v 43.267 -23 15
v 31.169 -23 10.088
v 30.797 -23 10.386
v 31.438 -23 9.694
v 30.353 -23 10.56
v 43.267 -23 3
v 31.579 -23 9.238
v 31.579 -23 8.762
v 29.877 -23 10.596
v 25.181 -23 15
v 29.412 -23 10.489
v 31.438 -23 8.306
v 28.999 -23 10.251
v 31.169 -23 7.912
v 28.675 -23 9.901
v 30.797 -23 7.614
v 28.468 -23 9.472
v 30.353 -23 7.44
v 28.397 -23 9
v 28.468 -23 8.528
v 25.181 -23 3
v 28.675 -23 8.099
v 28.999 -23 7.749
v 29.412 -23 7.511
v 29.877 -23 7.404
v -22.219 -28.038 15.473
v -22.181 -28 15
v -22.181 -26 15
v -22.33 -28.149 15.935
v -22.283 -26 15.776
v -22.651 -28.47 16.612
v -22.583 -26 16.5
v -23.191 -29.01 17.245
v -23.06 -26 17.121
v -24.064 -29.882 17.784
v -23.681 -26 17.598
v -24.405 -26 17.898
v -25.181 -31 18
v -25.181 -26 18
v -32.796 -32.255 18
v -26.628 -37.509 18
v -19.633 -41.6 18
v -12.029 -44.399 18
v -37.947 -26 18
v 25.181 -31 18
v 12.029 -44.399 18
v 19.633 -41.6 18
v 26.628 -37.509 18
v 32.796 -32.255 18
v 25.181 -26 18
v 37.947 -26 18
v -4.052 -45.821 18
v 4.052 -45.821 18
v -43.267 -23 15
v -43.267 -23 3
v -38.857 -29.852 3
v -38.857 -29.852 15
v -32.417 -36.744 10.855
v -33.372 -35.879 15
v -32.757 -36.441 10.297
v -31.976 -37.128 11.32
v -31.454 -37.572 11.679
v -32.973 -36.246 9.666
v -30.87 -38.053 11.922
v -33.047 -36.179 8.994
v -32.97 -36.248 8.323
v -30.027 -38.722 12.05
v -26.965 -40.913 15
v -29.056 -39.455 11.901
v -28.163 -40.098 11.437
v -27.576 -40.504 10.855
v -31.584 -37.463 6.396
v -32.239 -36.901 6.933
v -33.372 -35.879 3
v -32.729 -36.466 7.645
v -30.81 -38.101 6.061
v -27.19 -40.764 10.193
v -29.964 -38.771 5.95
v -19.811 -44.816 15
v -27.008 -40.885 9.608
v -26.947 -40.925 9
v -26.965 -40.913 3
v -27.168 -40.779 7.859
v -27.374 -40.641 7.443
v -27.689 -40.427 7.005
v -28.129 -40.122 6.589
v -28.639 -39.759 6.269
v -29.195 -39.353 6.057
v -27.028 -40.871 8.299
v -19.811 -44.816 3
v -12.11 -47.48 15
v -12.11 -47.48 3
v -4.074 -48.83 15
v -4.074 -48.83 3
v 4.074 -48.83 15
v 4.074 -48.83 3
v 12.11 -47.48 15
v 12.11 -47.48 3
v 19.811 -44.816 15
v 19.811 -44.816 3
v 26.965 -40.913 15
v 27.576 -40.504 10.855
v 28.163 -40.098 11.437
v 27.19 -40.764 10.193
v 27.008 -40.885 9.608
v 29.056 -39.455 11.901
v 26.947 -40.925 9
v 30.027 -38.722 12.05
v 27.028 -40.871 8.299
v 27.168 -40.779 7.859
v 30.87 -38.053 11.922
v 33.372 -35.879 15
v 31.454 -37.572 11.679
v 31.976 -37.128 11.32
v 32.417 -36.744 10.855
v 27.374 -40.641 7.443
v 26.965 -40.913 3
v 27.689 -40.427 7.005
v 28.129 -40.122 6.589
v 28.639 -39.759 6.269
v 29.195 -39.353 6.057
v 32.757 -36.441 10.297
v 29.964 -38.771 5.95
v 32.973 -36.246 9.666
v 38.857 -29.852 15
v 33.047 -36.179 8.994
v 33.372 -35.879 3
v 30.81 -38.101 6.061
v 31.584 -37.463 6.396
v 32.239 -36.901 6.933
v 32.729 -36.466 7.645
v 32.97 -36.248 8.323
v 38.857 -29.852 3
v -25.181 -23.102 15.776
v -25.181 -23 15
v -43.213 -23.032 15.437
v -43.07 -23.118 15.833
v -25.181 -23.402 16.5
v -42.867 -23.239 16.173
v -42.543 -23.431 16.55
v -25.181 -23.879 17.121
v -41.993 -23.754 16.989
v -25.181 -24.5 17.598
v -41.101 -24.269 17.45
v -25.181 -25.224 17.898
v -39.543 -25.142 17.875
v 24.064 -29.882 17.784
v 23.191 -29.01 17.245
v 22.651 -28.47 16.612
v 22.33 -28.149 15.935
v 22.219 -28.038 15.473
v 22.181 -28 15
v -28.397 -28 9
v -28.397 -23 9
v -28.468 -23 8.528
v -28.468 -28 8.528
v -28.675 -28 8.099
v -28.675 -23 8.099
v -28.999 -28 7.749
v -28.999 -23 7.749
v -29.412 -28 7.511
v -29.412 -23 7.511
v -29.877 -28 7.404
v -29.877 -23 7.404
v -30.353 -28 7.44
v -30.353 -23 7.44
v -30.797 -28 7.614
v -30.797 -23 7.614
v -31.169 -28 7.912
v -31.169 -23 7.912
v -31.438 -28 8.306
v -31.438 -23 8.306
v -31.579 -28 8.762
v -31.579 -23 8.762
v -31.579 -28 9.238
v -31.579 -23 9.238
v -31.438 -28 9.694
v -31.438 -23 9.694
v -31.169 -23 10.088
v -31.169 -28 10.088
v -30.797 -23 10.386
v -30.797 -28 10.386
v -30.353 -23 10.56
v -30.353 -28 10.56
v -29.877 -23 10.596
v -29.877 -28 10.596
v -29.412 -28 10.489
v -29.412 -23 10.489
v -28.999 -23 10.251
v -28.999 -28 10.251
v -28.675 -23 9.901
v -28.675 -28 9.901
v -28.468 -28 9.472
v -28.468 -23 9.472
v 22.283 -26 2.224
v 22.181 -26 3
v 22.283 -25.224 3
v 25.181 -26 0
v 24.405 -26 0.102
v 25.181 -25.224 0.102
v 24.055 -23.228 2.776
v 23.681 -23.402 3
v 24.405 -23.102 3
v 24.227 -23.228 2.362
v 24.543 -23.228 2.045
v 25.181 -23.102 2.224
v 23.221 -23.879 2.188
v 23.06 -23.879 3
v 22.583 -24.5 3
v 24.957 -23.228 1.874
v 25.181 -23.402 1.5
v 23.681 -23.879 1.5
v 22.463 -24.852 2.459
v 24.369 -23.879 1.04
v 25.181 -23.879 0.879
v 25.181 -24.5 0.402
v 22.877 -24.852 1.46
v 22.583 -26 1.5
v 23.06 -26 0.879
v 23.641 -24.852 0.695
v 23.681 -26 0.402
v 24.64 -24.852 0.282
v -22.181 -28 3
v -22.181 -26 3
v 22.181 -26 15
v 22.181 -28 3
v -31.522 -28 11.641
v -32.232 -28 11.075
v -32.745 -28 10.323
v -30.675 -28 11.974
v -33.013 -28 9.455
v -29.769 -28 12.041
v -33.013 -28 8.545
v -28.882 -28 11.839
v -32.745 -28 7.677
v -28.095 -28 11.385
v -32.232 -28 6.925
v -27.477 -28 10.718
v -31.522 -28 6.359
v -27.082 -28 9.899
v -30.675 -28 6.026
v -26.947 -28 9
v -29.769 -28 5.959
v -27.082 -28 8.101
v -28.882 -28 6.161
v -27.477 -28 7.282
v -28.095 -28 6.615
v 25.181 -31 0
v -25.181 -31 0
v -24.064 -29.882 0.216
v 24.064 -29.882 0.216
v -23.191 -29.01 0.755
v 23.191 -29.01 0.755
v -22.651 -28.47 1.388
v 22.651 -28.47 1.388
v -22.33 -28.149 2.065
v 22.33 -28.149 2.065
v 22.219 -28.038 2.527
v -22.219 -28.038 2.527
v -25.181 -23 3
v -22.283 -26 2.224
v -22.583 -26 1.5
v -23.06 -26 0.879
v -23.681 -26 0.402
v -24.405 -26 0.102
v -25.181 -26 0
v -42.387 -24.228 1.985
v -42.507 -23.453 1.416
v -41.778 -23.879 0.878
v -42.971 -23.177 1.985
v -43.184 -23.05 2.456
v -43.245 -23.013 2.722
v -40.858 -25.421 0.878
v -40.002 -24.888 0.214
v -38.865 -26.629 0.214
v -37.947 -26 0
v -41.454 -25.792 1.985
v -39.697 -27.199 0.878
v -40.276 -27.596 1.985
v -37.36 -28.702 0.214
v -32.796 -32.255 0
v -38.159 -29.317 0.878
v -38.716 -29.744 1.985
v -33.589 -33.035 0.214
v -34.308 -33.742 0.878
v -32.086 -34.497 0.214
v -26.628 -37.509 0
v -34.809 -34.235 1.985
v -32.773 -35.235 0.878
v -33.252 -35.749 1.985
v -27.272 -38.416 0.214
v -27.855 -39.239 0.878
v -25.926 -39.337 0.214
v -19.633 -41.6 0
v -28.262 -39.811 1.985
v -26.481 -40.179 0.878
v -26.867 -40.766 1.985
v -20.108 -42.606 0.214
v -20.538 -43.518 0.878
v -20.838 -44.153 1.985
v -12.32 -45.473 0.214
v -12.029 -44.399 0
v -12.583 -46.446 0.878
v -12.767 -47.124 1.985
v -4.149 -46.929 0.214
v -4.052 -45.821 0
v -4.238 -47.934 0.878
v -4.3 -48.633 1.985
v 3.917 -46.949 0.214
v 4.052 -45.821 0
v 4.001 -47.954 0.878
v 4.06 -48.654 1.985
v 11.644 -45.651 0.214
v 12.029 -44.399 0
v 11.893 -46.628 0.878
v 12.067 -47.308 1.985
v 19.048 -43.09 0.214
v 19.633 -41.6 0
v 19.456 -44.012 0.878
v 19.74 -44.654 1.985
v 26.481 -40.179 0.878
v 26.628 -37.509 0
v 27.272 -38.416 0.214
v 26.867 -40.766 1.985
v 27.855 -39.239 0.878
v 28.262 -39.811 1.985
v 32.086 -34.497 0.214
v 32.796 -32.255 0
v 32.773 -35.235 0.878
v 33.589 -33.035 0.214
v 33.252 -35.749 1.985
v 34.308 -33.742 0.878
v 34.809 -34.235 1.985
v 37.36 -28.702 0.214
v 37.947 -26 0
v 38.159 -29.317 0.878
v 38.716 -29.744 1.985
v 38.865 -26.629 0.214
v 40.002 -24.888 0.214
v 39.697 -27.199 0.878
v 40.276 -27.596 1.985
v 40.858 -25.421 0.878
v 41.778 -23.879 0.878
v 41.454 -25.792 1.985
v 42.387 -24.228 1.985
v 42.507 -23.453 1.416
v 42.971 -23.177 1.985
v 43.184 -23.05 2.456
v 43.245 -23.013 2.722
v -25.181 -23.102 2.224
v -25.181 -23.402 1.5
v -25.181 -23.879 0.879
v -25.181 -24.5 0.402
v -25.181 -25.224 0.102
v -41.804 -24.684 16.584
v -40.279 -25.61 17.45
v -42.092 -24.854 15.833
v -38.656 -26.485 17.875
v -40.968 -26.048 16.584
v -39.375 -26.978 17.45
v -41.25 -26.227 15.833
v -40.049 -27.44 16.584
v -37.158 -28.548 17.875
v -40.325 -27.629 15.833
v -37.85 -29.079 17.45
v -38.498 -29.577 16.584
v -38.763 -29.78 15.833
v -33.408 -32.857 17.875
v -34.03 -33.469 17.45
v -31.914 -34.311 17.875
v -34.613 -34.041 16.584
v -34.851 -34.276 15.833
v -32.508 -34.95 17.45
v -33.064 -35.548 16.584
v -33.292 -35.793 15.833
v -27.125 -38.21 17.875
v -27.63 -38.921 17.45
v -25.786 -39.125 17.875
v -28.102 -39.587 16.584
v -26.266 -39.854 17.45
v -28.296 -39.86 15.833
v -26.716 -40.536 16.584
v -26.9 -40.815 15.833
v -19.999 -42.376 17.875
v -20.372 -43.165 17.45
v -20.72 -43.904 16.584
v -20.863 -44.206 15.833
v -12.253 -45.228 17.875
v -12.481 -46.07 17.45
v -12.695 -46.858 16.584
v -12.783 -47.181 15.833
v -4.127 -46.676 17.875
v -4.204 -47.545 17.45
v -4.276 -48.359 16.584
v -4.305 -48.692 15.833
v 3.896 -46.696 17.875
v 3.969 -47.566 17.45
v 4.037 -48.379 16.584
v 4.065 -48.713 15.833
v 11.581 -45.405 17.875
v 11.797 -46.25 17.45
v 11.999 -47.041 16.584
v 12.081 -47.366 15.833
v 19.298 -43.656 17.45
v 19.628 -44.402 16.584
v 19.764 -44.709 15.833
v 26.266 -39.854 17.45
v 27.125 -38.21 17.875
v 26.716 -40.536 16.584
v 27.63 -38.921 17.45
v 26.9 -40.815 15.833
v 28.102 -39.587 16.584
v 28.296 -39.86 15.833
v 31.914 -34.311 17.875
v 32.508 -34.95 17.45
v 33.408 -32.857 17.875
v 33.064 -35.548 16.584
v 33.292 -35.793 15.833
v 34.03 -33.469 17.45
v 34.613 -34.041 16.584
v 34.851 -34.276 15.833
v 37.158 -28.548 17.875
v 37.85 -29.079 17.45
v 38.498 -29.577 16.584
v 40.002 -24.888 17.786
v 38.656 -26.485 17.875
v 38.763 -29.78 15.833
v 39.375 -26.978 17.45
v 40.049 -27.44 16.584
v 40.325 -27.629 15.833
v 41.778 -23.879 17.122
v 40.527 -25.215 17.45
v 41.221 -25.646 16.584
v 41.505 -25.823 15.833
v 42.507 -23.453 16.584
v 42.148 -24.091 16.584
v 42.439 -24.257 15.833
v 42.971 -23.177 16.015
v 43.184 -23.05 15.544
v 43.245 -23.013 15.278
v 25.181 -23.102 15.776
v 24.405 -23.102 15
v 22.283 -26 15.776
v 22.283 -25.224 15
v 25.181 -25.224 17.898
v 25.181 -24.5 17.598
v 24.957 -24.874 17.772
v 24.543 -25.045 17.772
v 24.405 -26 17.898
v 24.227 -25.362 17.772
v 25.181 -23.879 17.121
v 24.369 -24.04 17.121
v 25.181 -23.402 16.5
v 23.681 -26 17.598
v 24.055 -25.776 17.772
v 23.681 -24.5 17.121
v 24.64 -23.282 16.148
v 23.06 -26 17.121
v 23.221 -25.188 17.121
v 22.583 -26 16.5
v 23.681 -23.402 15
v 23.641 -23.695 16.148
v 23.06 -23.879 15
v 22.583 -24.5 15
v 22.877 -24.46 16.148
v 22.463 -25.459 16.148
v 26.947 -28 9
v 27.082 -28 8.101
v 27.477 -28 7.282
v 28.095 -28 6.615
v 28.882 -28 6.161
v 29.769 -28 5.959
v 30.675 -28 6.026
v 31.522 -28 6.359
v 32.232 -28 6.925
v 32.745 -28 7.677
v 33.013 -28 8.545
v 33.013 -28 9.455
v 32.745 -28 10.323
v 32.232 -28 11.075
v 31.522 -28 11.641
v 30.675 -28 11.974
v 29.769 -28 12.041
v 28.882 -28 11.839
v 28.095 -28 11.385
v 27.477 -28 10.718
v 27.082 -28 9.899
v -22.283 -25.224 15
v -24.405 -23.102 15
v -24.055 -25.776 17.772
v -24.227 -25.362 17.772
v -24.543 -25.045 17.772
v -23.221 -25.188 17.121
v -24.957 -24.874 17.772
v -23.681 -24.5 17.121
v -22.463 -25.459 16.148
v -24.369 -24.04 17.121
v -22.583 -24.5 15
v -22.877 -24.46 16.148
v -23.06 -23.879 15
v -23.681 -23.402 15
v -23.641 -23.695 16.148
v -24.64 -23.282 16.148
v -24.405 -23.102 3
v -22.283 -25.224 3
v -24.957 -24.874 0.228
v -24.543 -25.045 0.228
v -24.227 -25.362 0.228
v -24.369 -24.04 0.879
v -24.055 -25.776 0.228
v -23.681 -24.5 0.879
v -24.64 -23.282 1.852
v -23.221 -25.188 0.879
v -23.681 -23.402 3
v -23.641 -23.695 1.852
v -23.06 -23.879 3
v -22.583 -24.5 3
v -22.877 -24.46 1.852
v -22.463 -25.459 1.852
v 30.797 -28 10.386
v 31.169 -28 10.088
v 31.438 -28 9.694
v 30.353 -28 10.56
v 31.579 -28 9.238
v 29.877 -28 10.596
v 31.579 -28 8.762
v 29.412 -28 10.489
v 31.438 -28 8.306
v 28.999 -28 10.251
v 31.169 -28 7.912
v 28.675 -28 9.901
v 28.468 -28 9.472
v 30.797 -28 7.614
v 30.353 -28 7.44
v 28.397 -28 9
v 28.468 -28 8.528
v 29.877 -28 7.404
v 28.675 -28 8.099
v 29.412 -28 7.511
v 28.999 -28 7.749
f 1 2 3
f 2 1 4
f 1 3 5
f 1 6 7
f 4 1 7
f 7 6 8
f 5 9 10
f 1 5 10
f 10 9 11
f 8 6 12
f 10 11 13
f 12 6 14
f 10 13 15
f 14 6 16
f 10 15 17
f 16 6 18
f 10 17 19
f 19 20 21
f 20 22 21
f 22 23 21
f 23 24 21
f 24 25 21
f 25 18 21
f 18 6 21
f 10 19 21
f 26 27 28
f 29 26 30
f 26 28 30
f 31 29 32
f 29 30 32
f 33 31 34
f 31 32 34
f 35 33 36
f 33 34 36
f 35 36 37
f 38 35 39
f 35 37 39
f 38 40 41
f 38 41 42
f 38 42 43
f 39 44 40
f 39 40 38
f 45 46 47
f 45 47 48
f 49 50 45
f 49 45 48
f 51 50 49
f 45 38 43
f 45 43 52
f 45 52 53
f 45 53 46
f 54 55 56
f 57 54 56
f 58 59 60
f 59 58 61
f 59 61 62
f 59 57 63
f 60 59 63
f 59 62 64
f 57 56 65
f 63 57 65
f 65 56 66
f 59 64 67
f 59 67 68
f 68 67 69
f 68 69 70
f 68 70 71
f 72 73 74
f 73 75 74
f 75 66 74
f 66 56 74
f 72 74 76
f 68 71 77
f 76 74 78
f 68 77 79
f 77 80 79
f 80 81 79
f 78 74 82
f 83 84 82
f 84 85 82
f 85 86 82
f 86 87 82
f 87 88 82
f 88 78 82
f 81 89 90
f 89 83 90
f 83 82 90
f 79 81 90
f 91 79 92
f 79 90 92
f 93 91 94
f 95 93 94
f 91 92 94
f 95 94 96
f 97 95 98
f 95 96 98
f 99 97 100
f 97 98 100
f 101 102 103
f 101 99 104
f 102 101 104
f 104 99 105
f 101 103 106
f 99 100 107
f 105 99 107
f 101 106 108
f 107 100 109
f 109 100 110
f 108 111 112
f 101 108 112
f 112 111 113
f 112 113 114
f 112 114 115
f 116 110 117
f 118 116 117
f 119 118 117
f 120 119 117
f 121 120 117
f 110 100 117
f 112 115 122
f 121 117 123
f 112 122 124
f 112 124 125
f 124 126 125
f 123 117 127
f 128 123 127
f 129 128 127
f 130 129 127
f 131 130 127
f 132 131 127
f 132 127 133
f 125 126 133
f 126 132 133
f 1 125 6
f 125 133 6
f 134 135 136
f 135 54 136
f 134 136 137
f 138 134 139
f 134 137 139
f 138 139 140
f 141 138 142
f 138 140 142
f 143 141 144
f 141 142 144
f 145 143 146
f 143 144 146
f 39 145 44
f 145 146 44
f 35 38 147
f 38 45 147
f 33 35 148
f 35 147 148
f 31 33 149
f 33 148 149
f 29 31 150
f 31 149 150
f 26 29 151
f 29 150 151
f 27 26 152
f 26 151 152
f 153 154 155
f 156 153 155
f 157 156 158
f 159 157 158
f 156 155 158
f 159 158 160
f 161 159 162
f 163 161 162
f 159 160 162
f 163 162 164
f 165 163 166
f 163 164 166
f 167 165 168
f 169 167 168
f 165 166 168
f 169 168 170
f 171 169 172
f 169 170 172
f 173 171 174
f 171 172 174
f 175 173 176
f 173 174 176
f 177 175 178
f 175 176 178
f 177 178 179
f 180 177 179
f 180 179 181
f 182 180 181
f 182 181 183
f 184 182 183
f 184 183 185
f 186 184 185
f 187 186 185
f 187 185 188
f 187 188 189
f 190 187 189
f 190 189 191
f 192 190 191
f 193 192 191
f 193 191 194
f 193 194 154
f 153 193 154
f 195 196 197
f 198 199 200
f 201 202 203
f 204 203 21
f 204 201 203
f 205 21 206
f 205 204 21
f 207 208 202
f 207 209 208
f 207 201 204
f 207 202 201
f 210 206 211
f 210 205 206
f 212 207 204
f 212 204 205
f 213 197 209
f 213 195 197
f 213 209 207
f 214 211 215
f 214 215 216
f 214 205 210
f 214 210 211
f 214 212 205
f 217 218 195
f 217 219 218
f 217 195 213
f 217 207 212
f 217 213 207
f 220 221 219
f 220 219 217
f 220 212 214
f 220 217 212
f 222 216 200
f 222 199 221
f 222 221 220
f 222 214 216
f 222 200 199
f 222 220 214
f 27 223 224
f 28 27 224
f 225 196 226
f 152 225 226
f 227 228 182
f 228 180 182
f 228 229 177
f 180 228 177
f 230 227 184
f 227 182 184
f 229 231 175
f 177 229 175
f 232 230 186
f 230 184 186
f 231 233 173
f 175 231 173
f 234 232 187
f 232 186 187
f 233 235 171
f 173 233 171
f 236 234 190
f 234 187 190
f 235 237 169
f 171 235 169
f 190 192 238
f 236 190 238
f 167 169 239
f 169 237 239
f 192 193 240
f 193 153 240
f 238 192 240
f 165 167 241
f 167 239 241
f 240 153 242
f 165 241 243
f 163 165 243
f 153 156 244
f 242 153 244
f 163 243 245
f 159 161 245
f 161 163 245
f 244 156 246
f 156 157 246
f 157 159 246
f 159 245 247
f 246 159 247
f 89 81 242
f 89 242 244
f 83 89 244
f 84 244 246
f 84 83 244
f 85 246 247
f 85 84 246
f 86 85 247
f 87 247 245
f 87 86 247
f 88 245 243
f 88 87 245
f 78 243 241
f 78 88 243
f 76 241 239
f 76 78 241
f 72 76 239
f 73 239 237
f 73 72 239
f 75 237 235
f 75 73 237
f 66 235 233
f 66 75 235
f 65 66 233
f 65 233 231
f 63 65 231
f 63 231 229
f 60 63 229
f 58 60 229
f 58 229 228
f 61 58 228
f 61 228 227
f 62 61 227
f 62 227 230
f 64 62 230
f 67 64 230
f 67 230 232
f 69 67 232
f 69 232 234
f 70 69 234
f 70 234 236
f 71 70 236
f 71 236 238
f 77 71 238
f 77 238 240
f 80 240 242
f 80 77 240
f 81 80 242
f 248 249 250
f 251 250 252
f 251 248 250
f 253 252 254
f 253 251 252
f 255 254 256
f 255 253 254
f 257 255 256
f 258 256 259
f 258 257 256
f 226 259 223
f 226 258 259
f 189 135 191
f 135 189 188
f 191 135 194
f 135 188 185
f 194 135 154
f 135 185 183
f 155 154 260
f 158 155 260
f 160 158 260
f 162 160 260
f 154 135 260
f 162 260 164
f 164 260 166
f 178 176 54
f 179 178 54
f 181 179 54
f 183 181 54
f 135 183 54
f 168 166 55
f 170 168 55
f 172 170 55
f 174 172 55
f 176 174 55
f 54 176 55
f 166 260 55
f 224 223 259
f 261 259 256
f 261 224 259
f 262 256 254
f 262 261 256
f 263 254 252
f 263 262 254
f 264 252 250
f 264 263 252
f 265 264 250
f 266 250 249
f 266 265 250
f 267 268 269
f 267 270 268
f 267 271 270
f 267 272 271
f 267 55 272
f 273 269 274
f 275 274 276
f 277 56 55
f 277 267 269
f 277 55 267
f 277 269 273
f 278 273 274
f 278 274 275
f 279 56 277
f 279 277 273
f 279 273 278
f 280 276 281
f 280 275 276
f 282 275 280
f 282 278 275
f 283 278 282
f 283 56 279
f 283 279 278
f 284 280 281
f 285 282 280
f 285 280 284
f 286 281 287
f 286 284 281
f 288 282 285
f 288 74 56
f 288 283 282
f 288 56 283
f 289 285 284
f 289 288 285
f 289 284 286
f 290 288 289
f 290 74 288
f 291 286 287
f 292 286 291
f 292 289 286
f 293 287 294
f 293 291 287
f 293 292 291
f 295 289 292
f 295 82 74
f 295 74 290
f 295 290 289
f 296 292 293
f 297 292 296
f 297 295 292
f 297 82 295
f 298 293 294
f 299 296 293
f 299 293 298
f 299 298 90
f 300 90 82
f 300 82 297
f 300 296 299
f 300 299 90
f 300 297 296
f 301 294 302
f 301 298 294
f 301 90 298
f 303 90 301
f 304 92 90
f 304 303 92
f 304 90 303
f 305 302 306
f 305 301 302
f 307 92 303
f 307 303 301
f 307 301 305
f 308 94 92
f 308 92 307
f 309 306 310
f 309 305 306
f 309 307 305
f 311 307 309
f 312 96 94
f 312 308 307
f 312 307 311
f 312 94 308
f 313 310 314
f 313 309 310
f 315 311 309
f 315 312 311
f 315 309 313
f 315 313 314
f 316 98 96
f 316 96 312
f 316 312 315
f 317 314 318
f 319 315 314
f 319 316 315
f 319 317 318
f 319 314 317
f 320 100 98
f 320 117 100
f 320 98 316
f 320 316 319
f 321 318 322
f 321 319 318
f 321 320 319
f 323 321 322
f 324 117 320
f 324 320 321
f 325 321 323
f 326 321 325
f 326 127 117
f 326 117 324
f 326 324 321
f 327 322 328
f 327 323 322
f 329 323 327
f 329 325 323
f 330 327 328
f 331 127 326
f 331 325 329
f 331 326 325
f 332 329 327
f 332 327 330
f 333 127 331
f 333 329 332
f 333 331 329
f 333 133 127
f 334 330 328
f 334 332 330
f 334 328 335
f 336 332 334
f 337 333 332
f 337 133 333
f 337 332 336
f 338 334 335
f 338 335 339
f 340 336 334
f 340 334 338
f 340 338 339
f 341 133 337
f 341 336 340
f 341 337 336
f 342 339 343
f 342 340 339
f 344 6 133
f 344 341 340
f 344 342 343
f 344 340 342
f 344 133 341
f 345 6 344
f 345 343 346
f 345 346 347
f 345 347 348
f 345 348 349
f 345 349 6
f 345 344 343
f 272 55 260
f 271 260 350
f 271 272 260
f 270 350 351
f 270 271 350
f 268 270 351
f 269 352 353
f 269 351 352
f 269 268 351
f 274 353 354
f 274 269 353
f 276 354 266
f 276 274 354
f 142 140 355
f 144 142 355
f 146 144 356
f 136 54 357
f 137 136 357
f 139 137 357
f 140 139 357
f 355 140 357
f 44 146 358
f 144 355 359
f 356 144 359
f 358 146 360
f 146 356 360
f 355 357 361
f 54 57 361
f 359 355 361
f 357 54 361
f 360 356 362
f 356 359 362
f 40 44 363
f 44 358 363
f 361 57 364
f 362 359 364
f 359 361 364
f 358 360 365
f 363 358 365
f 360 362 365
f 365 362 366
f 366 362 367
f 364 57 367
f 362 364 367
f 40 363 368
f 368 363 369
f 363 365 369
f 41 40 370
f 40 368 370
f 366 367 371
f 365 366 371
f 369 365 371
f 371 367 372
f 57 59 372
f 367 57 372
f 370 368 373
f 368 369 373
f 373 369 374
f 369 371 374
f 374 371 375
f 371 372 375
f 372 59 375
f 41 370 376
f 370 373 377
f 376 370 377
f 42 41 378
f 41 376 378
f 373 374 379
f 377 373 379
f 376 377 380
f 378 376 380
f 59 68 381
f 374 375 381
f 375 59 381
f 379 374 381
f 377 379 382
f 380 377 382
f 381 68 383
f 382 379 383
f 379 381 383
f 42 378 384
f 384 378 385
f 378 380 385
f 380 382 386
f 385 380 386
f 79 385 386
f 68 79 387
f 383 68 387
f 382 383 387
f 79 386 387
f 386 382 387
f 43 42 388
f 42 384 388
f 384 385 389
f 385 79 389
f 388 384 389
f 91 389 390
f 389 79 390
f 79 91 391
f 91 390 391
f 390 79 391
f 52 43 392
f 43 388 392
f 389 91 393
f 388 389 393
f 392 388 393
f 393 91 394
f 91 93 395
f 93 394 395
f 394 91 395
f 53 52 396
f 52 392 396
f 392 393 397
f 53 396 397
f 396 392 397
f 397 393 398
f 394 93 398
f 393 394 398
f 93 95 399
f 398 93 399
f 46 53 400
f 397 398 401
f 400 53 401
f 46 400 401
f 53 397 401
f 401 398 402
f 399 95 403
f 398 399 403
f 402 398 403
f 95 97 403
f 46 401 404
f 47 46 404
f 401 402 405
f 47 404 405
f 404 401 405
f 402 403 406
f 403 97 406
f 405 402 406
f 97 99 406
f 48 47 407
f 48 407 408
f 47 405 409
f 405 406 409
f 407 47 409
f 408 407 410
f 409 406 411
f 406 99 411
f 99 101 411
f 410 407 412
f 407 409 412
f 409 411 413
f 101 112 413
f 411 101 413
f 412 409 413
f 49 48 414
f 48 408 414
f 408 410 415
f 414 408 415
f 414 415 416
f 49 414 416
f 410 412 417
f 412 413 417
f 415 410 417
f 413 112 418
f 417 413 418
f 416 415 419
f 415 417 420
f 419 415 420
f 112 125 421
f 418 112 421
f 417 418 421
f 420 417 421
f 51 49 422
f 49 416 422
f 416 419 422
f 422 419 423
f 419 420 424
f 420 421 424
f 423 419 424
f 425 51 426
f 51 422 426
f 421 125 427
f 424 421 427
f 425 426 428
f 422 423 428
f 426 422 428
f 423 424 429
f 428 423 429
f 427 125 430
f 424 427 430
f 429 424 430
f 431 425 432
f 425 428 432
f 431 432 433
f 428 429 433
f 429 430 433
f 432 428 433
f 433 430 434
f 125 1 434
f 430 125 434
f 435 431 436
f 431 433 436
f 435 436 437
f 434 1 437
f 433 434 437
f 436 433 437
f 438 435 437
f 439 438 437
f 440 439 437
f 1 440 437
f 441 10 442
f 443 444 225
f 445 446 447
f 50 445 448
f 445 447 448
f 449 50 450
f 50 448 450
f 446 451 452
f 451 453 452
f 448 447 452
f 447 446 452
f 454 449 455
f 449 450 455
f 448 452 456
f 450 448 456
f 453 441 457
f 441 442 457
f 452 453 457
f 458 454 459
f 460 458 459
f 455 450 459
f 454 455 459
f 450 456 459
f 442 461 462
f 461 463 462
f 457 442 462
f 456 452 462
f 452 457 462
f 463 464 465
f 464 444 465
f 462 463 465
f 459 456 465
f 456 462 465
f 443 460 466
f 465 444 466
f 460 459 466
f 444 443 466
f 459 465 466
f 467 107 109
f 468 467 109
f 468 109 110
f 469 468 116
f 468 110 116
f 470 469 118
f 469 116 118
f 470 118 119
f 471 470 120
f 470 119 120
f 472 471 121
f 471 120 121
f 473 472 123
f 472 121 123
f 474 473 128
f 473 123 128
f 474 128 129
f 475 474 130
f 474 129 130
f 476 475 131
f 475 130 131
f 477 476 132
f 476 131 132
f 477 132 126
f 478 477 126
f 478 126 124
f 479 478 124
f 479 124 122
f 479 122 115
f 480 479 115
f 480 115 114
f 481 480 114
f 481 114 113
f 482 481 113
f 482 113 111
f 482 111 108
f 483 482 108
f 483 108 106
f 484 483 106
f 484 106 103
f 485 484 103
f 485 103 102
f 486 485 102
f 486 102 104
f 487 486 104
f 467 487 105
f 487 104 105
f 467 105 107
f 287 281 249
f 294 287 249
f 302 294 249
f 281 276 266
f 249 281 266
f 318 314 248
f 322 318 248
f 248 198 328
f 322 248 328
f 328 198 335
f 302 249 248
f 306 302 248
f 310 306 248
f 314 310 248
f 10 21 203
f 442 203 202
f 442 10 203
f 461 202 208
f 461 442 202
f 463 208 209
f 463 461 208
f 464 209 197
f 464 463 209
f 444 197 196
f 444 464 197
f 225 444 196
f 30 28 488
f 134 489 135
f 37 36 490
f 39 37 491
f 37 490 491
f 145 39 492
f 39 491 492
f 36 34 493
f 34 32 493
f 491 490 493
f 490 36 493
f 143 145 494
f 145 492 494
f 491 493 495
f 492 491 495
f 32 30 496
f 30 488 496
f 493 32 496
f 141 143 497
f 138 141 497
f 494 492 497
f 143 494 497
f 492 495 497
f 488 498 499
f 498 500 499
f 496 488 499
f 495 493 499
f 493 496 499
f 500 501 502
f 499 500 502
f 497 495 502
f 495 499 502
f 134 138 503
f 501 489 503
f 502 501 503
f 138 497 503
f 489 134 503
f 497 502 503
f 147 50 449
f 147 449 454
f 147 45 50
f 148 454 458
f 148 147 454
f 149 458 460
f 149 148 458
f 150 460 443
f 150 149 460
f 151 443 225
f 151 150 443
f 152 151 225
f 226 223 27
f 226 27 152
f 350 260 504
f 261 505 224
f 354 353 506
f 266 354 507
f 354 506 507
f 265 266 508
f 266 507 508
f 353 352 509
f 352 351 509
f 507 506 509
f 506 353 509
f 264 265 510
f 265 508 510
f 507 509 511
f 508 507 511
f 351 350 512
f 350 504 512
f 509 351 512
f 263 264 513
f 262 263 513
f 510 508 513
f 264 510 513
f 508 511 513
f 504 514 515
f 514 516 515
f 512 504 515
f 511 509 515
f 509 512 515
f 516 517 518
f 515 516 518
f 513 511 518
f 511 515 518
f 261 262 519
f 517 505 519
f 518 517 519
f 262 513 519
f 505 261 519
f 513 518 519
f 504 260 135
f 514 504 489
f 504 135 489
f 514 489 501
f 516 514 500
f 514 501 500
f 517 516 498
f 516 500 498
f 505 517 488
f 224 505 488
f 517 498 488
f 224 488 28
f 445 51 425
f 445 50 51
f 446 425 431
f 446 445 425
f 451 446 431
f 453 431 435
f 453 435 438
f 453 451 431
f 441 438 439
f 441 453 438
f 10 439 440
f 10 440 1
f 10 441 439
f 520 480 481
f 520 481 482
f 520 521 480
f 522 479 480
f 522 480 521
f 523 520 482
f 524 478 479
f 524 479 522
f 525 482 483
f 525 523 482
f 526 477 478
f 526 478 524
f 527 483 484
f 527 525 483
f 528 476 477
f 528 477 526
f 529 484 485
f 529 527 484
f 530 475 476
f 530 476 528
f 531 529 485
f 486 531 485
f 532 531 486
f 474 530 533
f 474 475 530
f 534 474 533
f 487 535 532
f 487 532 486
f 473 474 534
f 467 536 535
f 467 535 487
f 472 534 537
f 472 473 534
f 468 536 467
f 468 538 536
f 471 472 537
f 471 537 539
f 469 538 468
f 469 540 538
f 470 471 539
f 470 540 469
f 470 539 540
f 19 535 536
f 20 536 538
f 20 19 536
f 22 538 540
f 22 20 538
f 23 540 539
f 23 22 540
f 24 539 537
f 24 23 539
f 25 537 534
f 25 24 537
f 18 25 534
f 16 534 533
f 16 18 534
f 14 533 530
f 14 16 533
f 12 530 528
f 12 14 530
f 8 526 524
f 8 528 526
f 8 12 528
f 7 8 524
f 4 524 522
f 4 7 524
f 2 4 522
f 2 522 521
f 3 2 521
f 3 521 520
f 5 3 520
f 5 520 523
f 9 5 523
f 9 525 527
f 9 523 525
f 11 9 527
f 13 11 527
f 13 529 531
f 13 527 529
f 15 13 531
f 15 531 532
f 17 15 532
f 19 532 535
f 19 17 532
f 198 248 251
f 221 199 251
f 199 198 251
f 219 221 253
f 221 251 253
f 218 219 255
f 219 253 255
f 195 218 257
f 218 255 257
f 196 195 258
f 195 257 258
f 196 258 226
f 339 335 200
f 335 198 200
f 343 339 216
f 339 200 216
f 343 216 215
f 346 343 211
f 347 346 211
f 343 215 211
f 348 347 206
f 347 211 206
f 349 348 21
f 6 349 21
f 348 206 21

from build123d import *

# Parameters (mm, degrees)
SKETCH1_W           = 44.362146026
SKETCH1_H           = 10
BOSS_EXTRUDE1_DEPTH = 18
SKETCH2_R           = 1.6
CUT_EXTRUDE1_DEPTH  = 27
CUT_EXTRUDE2_START  = -17.925297
SKETCH3_R           = 3.05
CUT_EXTRUDE2_DEPTH  = 12.925297
FILLET1_R           = 3


with BuildPart() as part:
    # Sketch1 → Boss-Extrude1 (new body)
    with BuildSketch(Plane.XY):
        with BuildLine():
            Line((-29.953929645, -23), (-37.509998667, -23))
            ThreePointArc((-37.509998667, -23), (-35.812927639, -25.562359318), (-33.941125497, -28))
            Line((-33.941125497, -28), (-22.181073013, -28))
            Line((-22.181073013, -28), (-22.181073013, -23))
            Line((-22.181073013, -23), (-29.953929645, -23))
        make_face()
        with BuildLine():
            Line((-37.509998667, -23), (-43.266615306, -23))
            ThreePointArc((-43.266615306, -23), (0, -49), (43.266615306, -23))
            Line((43.266615306, -23), (37.509998667, -23))
            ThreePointArc((37.509998667, -23), (35.812927639, -25.562359318), (33.941125497, -28))
            ThreePointArc((33.941125497, -28), (28.503075122, -33.519765939), (22.181073013, -38))
            ThreePointArc((22.181073013, -38), (0, -44), (-22.181073013, -38))
            ThreePointArc((-22.181073013, -38), (-28.503075122, -33.519765939), (-33.941125497, -28))
            ThreePointArc((-33.941125497, -28), (-35.812927639, -25.562359318), (-37.509998667, -23))
        make_face()
        with BuildLine():
            Line((-22.181073013, -28), (-33.941125497, -28))
            ThreePointArc((-33.941125497, -28), (-28.503075122, -33.519765939), (-22.181073013, -38))
            Line((-22.181073013, -38), (-22.181073013, -28))
        make_face()
        with BuildLine():
            ThreePointArc((22.181073013, -38), (28.503075122, -33.519765939), (33.941125497, -28))
            Line((33.941125497, -28), (22.181073013, -28))
            Line((22.181073013, -28), (22.181073013, -38))
        make_face()
        with BuildLine():
            ThreePointArc((33.941125497, -28), (35.812927639, -25.562359318), (37.509998667, -23))
            Line((37.509998667, -23), (22.181073013, -23))
            Line((22.181073013, -23), (22.181073013, -28))
            Line((22.181073013, -28), (33.941125497, -28))
        make_face()
        with Locations((0, -33)):
            Rectangle(SKETCH1_W, SKETCH1_H)
        with BuildLine():
            Line((22.181073013, -38), (-22.181073013, -38))
            ThreePointArc((-22.181073013, -38), (0, -44), (22.181073013, -38))
        make_face()
    extrude(amount=BOSS_EXTRUDE1_DEPTH)

    # Sketch2 → Cut-Extrude1 (cut, through all)
    with BuildSketch(Plane(origin=(0, -23, 0), x_dir=(1, 0, 0), z_dir=(0, 1, 0))):
        with Locations((-29.996615306, -9)):
            Circle(SKETCH2_R)
    cut_extrude1 = extrude(amount=-CUT_EXTRUDE1_DEPTH, mode=Mode.SUBTRACT)

    # Sketch3 → Cut-Extrude2 (cut)
    with BuildSketch(Plane(origin=(0, -23, 0), x_dir=(1, 0, 0), z_dir=(0, 1, 0)).offset(CUT_EXTRUDE2_START)):
        with Locations((-29.996615306, -9)):
            Circle(SKETCH3_R)
    cut_extrude2 = extrude(amount=CUT_EXTRUDE2_DEPTH, mode=Mode.SUBTRACT)

    # Mirror1: Cut-Extrude1, Cut-Extrude2 across plane
    add(cut_extrude1.mirror(Plane(origin=(0, 0, 0), x_dir=(0, 0, 1), z_dir=(1, 0, 0))), mode=Mode.SUBTRACT)
    add(cut_extrude2.mirror(Plane(origin=(0, 0, 0), x_dir=(0, 0, 1), z_dir=(1, 0, 0))), mode=Mode.SUBTRACT)

    # Fillet1
    fillet1_edges = [part.edges().sort_by_distance(p)[0] for p in [
        (0, -28, 18),
        (0, -28, 0),
        (22.181073013, -25.5, 0),
        (22.181073013, -23, 9),
        (-22.181073013, -23, 9),
        (-22.181073013, -25.5, 18),
        (-32.723844159, -23, 18),
        (0, -49, 18),
        (32.723844159, -23, 18),
        (22.181073013, -25.5, 18),
        (32.723844159, -23, 0),
        (0, -49, 0),
        (-32.723844159, -23, 0),
        (-22.181073013, -25.5, 0),
    ]]
    fillet(fillet1_edges, radius=FILLET1_R)


solid = part.part
